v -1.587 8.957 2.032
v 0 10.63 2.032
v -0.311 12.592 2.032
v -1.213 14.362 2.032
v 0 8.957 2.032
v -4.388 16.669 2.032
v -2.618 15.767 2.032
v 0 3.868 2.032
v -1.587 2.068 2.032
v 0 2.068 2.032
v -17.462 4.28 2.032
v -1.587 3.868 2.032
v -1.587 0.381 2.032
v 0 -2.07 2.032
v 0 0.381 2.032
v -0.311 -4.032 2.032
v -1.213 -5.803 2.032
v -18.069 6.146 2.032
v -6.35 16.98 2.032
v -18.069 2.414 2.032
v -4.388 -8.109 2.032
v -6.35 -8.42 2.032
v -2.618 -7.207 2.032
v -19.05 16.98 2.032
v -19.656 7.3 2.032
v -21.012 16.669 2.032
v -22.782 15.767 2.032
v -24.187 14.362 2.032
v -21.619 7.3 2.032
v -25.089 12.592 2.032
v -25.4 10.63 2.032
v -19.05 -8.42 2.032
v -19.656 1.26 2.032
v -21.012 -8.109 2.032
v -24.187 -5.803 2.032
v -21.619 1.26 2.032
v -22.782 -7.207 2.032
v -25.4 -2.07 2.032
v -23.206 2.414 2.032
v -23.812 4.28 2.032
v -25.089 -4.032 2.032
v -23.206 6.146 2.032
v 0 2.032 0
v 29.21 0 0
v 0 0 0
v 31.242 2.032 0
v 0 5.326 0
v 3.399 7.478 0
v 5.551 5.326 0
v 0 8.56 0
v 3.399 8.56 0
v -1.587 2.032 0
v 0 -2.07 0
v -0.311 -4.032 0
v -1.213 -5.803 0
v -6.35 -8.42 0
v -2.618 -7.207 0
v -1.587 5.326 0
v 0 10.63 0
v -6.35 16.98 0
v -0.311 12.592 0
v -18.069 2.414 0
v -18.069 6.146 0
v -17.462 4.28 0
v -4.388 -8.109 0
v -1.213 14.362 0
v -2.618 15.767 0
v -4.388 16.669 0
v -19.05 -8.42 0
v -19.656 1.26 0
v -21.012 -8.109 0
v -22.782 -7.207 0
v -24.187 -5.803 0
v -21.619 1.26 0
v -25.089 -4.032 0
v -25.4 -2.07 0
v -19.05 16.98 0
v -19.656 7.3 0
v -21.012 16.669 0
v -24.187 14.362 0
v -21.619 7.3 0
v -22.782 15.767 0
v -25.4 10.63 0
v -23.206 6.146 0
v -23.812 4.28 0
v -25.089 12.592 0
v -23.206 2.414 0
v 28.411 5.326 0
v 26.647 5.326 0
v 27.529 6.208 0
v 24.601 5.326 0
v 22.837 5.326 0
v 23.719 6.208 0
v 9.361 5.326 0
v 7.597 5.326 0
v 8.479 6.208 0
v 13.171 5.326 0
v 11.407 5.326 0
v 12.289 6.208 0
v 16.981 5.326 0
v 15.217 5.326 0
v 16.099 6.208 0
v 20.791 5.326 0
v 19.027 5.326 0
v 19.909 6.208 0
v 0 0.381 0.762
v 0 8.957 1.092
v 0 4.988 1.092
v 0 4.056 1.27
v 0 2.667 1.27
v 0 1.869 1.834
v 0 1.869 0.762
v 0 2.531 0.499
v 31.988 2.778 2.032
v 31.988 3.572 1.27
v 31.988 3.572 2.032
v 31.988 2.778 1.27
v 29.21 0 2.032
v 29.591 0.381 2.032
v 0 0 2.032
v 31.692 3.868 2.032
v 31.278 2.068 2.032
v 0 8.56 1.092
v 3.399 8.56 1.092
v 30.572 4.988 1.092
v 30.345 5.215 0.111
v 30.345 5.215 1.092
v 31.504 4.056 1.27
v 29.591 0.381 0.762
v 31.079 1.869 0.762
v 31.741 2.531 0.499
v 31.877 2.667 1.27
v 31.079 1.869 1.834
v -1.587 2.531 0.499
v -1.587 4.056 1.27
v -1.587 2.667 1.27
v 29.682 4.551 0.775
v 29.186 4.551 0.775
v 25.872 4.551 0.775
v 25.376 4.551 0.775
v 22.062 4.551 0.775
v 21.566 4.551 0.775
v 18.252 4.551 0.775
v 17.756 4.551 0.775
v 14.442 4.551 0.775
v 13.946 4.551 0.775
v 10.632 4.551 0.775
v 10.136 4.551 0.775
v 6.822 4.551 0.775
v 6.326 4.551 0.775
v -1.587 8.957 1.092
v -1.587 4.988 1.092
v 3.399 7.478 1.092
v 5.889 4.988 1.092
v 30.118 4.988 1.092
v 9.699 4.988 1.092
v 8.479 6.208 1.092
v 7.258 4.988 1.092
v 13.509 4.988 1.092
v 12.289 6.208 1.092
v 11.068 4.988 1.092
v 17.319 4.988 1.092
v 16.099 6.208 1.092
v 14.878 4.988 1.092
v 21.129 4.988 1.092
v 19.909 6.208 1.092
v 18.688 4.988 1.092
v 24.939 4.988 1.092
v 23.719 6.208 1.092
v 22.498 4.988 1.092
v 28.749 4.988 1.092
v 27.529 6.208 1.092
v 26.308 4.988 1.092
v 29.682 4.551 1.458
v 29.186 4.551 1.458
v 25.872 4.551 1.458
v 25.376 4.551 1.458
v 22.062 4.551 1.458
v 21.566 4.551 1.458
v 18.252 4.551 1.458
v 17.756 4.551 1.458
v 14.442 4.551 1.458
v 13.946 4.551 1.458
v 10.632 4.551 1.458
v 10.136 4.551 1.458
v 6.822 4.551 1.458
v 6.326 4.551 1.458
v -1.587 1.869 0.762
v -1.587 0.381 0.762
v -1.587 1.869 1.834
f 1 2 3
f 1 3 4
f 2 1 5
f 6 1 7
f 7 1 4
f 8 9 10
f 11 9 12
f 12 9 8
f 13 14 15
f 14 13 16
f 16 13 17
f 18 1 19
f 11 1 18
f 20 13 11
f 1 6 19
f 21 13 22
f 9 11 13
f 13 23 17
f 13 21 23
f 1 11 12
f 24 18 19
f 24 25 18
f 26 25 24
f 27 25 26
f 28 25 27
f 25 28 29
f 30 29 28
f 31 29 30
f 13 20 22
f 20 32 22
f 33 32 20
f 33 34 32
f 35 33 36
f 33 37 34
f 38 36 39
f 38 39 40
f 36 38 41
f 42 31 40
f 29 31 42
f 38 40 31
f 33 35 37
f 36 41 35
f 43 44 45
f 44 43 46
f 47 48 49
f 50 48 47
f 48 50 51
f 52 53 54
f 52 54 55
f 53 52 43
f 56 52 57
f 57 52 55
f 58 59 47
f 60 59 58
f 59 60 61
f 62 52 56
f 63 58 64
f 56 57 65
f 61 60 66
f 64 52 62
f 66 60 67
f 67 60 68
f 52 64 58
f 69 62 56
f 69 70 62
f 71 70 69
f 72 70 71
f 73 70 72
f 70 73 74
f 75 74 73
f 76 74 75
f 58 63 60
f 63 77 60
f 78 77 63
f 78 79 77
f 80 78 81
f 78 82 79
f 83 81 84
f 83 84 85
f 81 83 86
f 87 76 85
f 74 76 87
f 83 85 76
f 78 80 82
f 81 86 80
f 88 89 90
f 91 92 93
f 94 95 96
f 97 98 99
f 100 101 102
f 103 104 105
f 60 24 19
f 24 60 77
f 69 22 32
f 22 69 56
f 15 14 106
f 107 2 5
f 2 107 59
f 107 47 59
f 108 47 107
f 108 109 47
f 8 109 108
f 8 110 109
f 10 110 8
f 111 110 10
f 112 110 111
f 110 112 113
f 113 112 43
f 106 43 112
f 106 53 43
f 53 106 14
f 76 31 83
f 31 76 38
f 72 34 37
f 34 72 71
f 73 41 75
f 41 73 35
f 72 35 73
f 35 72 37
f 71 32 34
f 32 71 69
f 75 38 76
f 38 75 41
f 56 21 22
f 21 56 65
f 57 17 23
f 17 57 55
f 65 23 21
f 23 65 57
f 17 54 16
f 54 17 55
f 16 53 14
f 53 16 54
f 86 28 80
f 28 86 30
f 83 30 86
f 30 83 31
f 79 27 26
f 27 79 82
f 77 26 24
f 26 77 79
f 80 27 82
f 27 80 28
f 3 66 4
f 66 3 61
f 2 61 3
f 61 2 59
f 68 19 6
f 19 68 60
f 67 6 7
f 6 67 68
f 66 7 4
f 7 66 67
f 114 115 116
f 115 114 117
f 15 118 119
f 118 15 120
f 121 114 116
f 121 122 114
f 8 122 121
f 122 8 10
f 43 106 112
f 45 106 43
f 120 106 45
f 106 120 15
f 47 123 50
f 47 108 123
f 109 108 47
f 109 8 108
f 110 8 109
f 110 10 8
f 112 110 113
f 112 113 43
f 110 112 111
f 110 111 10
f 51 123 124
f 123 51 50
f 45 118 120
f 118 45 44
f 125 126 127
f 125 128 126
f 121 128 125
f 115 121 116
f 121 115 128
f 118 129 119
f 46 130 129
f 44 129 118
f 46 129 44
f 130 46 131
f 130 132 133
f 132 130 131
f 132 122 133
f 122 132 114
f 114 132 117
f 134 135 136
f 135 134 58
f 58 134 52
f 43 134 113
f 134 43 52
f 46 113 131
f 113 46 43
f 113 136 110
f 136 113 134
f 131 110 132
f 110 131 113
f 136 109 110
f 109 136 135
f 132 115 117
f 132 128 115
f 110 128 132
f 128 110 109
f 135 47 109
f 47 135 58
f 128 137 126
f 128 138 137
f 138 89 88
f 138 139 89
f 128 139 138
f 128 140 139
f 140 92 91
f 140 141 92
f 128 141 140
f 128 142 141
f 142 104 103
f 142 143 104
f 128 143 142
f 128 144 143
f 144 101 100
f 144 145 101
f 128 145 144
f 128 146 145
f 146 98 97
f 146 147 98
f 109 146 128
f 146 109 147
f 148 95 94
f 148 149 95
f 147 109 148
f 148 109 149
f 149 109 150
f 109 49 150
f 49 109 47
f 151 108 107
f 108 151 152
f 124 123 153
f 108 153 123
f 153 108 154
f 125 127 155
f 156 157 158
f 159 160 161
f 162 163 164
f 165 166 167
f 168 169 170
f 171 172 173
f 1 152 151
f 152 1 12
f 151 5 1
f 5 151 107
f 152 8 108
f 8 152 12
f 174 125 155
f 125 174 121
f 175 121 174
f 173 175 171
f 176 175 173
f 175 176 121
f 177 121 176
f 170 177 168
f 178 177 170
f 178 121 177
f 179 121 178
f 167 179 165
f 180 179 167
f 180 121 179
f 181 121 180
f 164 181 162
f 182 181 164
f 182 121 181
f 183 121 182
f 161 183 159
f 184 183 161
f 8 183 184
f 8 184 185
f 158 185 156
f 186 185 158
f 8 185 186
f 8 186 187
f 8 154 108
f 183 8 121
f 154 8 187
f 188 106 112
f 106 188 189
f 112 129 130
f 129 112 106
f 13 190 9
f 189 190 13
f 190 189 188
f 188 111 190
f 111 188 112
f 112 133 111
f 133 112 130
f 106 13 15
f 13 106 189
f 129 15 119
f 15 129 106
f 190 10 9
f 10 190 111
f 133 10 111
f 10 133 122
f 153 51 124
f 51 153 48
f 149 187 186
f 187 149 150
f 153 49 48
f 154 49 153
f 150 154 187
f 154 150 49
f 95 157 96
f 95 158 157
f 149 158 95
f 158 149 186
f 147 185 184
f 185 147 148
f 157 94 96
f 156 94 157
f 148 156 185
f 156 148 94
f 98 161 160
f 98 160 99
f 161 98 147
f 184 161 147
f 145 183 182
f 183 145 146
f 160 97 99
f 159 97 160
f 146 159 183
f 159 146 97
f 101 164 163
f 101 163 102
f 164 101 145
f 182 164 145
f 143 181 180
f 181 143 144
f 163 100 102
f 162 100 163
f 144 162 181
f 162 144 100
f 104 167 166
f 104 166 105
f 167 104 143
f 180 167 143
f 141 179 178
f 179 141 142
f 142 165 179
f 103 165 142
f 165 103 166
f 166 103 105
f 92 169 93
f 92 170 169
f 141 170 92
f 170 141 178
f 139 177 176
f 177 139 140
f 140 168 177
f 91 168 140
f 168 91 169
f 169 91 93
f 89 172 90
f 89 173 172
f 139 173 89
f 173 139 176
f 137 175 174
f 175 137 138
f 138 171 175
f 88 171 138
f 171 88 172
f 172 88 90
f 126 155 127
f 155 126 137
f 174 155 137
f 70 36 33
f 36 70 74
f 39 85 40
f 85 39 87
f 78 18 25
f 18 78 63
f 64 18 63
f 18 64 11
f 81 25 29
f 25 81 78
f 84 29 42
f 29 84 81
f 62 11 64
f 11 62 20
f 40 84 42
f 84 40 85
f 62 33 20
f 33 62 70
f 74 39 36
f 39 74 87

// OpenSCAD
// Physical Keygen for KW1 - by Nirav Patel <http://eclecti.cc>
// Revisions for KW10 - by Scott Elliott <mysd300.blogspot.com>
//
// Generate a duplicate of a Kwikset KW1 key by editing the last line of the file
// and entering in the key code of the lock.  If you don't know the key code,
// you can measure the key and compare the numbers at:
// http://web.archive.org/web/20050217020917fw_/http://dlaco.com/spacing/tips.htm
//
// This work is licensed under a Creative Commons Attribution 3.0 Unported License.

// Since the keys and locks I have were all designed in imperial units, the
// constants in this file will be defined in inches.  The mm function
// allows us to retain the proper size for exporting a metric STL.
function mm(i) = i*25.4;

module rounded(size, r) {
    union() {
        translate([r, 0, 0]) cube([size[0]-2*r, size[1], size[2]]);
        translate([0, r, 0]) cube([size[0], size[1]-2*r, size[2]]);
        translate([r, r, 0]) cylinder(h=size[2], r=r);
        translate([size[0]-r, r, 0]) cylinder(h=size[2], r=r);
        translate([r, size[1]-r, 0]) cylinder(h=size[2], r=r);
        translate([size[0]-r, size[1]-r, 0]) cylinder(h=size[2], r=r);
    }
}

module bit(bitw) {
    w = mm(1/4);
    difference() {
        translate([-w/2, 0, 0]) cube([w, mm(1), w]);
        translate([-mm(5/bitw), 0, 0]) rotate([0, 0, 135]) cube([w, w, w]);
        translate([mm(5/bitw), 0, 0]) rotate([0, 0, -45]) cube([w, w, w]);
    }
}

// Kwikset KW10, 6 pin key.  The measurements are mostly guesses based on reverse
// engineering some keys I have and some publicly available information.

module KW10(switch,bits) {

    usebitting = (switch == "code");
    makebump = (switch == "bump");


    // You may need to adjust these to fit your specific printer settings
    thickness = mm(0.080);
    length = mm(9/8)+mm(0.15); // add sixth pin
    width = mm(0.337);
    
    shoulder = mm(0.247);
    pin_spacing = mm(0.15);
    depth_inc = mm(0.023);
    
    // A fudge factor.  Printing with your average RepRap, the bottom layer is
    // going to be squeezed larger than you want. You can make the pins
    // go slighly deeper by a fudge amount to make up for it if you aren't
    // adjusting for it elsewhere like Skeinforge or in your firmware.
    fudge = 0.3; // try 0.5 for kit printers
    
    // Handle size
    h_l = mm(1);
    h_w = mm(1);
    h_d = mm(1/16);
    difference() {
        // blade and key handle
        union() {
            translate([-h_l, -h_w/2 + width/2, 0]) rounded([h_l, h_w, thickness], mm(1/4));
            // cut a little off the tip to avoid going too long
            cube([length - mm(1/64), width, thickness]);
        }
        
        // chamfer the tip
        translate([length, mm(1/8), 0]) {
            rotate([0, 0, 45]) cube([10, 10, thickness]);
            rotate([0, 0, 225]) cube([10, 10, thickness]);
        }
        
        // put in a hole for keychain use
        translate([-h_l + mm(3/16), width/2, 0]) cylinder(h=thickness, r=mm(1/8));
        
        // cut the channels in the key.  designed more for printability than accuracy
        union() {
            translate([-h_d, mm(0.105), mm(0.025)]) rotate([225, 0, 0]) cube([length + h_d, width, width]);
            translate([-h_d, mm(0.105), mm(0.05)]) rotate([260, 0, 0]) cube([length + h_d, thickness/2, mm(1/32)]);
            translate([-h_d, mm(0.105), 0]) cube([length + h_d, mm(7/128), mm(0.05)]);
            translate([-h_d, mm(0.105) + mm(7/128), mm(0.05)]) rotate([225, 0, 0]) cube([length + h_d, mm(3/64), thickness]);
        }
        
        translate([-h_d, width - mm(9/64), mm(0.043)]) {
            cube([length + h_d, width - (width - mm(10/64)), thickness]);
            rotate([50, 0, 0]) cube([length + h_d, width, thickness]);
        }
        
        union() {
            translate([-h_d, mm(0.015), mm(0.03)]) cube([length + h_d, mm(15/256), thickness]);
            translate([-h_d, mm(0.015) + mm(13/256), thickness - mm(1/64)]) rotate([45, 0, 0]) cube([length + h_d, mm(1/16), mm(1/16)]);
        }
        
      // Do the actual bitting
     if (usebitting) {
          for (b = [0:5]) {
              // Kwikset doesn't have a 0 value and instead has 1 start around .008" deep
              translate([shoulder + fudge + b*pin_spacing, width - mm(0.008) - (bits[b] - 1)*depth_inc - fudge, 0]) bit(128);
        }}

	  if (makebump) {
         // KW doesn't have a 0 value and instead has 1 start around .008" deep
         translate([shoulder + fudge + 0*pin_spacing, width - mm(.008) - (bits[0] - 1)*depth_inc - fudge, 0]) bit(512);
         translate([shoulder + fudge + 1*pin_spacing, width - mm(.008) - (bits[1] - 1)*depth_inc - fudge, 0]) bit(512);
         translate([shoulder + fudge + 2*pin_spacing, width - mm(.008) - (bits[2] - 1)*depth_inc - fudge, 0]) bit(512);
         translate([shoulder + fudge + 3*pin_spacing, width - mm(.008) - (bits[3] - 1)*depth_inc - fudge, 0]) bit(512);
         translate([shoulder + fudge + 4*pin_spacing, width - mm(.008) - (bits[4] - 1)*depth_inc - fudge, 0]) bit(512);
         translate([shoulder + fudge + 5*pin_spacing, width - mm(.008) - (bits[5] - 1)*depth_inc - fudge, 0]) bit(512);               
         translate([shoulder + fudge + 6*pin_spacing, width - mm(.008) - (bits[5] - 1)*depth_inc - fudge, 0]) bit(512);
       }

    }

}
// This sample key goes to a lock that is sitting disassembled on my desk
// Flip the key over for easy printing
// kw1([1,3,3,2,3]);

// Thickness from edge to keel:
// 1 = 7.96
// 2 = 7.31
// 3 = 6.84
// 4 = 6.26
// 5 = 5.67
// 6 = 5.09
// 7 = 4.50

//KW10("code",[9,9,9,9,9,9]);
KW10("bump",[7,7,7,7,7,7]);
